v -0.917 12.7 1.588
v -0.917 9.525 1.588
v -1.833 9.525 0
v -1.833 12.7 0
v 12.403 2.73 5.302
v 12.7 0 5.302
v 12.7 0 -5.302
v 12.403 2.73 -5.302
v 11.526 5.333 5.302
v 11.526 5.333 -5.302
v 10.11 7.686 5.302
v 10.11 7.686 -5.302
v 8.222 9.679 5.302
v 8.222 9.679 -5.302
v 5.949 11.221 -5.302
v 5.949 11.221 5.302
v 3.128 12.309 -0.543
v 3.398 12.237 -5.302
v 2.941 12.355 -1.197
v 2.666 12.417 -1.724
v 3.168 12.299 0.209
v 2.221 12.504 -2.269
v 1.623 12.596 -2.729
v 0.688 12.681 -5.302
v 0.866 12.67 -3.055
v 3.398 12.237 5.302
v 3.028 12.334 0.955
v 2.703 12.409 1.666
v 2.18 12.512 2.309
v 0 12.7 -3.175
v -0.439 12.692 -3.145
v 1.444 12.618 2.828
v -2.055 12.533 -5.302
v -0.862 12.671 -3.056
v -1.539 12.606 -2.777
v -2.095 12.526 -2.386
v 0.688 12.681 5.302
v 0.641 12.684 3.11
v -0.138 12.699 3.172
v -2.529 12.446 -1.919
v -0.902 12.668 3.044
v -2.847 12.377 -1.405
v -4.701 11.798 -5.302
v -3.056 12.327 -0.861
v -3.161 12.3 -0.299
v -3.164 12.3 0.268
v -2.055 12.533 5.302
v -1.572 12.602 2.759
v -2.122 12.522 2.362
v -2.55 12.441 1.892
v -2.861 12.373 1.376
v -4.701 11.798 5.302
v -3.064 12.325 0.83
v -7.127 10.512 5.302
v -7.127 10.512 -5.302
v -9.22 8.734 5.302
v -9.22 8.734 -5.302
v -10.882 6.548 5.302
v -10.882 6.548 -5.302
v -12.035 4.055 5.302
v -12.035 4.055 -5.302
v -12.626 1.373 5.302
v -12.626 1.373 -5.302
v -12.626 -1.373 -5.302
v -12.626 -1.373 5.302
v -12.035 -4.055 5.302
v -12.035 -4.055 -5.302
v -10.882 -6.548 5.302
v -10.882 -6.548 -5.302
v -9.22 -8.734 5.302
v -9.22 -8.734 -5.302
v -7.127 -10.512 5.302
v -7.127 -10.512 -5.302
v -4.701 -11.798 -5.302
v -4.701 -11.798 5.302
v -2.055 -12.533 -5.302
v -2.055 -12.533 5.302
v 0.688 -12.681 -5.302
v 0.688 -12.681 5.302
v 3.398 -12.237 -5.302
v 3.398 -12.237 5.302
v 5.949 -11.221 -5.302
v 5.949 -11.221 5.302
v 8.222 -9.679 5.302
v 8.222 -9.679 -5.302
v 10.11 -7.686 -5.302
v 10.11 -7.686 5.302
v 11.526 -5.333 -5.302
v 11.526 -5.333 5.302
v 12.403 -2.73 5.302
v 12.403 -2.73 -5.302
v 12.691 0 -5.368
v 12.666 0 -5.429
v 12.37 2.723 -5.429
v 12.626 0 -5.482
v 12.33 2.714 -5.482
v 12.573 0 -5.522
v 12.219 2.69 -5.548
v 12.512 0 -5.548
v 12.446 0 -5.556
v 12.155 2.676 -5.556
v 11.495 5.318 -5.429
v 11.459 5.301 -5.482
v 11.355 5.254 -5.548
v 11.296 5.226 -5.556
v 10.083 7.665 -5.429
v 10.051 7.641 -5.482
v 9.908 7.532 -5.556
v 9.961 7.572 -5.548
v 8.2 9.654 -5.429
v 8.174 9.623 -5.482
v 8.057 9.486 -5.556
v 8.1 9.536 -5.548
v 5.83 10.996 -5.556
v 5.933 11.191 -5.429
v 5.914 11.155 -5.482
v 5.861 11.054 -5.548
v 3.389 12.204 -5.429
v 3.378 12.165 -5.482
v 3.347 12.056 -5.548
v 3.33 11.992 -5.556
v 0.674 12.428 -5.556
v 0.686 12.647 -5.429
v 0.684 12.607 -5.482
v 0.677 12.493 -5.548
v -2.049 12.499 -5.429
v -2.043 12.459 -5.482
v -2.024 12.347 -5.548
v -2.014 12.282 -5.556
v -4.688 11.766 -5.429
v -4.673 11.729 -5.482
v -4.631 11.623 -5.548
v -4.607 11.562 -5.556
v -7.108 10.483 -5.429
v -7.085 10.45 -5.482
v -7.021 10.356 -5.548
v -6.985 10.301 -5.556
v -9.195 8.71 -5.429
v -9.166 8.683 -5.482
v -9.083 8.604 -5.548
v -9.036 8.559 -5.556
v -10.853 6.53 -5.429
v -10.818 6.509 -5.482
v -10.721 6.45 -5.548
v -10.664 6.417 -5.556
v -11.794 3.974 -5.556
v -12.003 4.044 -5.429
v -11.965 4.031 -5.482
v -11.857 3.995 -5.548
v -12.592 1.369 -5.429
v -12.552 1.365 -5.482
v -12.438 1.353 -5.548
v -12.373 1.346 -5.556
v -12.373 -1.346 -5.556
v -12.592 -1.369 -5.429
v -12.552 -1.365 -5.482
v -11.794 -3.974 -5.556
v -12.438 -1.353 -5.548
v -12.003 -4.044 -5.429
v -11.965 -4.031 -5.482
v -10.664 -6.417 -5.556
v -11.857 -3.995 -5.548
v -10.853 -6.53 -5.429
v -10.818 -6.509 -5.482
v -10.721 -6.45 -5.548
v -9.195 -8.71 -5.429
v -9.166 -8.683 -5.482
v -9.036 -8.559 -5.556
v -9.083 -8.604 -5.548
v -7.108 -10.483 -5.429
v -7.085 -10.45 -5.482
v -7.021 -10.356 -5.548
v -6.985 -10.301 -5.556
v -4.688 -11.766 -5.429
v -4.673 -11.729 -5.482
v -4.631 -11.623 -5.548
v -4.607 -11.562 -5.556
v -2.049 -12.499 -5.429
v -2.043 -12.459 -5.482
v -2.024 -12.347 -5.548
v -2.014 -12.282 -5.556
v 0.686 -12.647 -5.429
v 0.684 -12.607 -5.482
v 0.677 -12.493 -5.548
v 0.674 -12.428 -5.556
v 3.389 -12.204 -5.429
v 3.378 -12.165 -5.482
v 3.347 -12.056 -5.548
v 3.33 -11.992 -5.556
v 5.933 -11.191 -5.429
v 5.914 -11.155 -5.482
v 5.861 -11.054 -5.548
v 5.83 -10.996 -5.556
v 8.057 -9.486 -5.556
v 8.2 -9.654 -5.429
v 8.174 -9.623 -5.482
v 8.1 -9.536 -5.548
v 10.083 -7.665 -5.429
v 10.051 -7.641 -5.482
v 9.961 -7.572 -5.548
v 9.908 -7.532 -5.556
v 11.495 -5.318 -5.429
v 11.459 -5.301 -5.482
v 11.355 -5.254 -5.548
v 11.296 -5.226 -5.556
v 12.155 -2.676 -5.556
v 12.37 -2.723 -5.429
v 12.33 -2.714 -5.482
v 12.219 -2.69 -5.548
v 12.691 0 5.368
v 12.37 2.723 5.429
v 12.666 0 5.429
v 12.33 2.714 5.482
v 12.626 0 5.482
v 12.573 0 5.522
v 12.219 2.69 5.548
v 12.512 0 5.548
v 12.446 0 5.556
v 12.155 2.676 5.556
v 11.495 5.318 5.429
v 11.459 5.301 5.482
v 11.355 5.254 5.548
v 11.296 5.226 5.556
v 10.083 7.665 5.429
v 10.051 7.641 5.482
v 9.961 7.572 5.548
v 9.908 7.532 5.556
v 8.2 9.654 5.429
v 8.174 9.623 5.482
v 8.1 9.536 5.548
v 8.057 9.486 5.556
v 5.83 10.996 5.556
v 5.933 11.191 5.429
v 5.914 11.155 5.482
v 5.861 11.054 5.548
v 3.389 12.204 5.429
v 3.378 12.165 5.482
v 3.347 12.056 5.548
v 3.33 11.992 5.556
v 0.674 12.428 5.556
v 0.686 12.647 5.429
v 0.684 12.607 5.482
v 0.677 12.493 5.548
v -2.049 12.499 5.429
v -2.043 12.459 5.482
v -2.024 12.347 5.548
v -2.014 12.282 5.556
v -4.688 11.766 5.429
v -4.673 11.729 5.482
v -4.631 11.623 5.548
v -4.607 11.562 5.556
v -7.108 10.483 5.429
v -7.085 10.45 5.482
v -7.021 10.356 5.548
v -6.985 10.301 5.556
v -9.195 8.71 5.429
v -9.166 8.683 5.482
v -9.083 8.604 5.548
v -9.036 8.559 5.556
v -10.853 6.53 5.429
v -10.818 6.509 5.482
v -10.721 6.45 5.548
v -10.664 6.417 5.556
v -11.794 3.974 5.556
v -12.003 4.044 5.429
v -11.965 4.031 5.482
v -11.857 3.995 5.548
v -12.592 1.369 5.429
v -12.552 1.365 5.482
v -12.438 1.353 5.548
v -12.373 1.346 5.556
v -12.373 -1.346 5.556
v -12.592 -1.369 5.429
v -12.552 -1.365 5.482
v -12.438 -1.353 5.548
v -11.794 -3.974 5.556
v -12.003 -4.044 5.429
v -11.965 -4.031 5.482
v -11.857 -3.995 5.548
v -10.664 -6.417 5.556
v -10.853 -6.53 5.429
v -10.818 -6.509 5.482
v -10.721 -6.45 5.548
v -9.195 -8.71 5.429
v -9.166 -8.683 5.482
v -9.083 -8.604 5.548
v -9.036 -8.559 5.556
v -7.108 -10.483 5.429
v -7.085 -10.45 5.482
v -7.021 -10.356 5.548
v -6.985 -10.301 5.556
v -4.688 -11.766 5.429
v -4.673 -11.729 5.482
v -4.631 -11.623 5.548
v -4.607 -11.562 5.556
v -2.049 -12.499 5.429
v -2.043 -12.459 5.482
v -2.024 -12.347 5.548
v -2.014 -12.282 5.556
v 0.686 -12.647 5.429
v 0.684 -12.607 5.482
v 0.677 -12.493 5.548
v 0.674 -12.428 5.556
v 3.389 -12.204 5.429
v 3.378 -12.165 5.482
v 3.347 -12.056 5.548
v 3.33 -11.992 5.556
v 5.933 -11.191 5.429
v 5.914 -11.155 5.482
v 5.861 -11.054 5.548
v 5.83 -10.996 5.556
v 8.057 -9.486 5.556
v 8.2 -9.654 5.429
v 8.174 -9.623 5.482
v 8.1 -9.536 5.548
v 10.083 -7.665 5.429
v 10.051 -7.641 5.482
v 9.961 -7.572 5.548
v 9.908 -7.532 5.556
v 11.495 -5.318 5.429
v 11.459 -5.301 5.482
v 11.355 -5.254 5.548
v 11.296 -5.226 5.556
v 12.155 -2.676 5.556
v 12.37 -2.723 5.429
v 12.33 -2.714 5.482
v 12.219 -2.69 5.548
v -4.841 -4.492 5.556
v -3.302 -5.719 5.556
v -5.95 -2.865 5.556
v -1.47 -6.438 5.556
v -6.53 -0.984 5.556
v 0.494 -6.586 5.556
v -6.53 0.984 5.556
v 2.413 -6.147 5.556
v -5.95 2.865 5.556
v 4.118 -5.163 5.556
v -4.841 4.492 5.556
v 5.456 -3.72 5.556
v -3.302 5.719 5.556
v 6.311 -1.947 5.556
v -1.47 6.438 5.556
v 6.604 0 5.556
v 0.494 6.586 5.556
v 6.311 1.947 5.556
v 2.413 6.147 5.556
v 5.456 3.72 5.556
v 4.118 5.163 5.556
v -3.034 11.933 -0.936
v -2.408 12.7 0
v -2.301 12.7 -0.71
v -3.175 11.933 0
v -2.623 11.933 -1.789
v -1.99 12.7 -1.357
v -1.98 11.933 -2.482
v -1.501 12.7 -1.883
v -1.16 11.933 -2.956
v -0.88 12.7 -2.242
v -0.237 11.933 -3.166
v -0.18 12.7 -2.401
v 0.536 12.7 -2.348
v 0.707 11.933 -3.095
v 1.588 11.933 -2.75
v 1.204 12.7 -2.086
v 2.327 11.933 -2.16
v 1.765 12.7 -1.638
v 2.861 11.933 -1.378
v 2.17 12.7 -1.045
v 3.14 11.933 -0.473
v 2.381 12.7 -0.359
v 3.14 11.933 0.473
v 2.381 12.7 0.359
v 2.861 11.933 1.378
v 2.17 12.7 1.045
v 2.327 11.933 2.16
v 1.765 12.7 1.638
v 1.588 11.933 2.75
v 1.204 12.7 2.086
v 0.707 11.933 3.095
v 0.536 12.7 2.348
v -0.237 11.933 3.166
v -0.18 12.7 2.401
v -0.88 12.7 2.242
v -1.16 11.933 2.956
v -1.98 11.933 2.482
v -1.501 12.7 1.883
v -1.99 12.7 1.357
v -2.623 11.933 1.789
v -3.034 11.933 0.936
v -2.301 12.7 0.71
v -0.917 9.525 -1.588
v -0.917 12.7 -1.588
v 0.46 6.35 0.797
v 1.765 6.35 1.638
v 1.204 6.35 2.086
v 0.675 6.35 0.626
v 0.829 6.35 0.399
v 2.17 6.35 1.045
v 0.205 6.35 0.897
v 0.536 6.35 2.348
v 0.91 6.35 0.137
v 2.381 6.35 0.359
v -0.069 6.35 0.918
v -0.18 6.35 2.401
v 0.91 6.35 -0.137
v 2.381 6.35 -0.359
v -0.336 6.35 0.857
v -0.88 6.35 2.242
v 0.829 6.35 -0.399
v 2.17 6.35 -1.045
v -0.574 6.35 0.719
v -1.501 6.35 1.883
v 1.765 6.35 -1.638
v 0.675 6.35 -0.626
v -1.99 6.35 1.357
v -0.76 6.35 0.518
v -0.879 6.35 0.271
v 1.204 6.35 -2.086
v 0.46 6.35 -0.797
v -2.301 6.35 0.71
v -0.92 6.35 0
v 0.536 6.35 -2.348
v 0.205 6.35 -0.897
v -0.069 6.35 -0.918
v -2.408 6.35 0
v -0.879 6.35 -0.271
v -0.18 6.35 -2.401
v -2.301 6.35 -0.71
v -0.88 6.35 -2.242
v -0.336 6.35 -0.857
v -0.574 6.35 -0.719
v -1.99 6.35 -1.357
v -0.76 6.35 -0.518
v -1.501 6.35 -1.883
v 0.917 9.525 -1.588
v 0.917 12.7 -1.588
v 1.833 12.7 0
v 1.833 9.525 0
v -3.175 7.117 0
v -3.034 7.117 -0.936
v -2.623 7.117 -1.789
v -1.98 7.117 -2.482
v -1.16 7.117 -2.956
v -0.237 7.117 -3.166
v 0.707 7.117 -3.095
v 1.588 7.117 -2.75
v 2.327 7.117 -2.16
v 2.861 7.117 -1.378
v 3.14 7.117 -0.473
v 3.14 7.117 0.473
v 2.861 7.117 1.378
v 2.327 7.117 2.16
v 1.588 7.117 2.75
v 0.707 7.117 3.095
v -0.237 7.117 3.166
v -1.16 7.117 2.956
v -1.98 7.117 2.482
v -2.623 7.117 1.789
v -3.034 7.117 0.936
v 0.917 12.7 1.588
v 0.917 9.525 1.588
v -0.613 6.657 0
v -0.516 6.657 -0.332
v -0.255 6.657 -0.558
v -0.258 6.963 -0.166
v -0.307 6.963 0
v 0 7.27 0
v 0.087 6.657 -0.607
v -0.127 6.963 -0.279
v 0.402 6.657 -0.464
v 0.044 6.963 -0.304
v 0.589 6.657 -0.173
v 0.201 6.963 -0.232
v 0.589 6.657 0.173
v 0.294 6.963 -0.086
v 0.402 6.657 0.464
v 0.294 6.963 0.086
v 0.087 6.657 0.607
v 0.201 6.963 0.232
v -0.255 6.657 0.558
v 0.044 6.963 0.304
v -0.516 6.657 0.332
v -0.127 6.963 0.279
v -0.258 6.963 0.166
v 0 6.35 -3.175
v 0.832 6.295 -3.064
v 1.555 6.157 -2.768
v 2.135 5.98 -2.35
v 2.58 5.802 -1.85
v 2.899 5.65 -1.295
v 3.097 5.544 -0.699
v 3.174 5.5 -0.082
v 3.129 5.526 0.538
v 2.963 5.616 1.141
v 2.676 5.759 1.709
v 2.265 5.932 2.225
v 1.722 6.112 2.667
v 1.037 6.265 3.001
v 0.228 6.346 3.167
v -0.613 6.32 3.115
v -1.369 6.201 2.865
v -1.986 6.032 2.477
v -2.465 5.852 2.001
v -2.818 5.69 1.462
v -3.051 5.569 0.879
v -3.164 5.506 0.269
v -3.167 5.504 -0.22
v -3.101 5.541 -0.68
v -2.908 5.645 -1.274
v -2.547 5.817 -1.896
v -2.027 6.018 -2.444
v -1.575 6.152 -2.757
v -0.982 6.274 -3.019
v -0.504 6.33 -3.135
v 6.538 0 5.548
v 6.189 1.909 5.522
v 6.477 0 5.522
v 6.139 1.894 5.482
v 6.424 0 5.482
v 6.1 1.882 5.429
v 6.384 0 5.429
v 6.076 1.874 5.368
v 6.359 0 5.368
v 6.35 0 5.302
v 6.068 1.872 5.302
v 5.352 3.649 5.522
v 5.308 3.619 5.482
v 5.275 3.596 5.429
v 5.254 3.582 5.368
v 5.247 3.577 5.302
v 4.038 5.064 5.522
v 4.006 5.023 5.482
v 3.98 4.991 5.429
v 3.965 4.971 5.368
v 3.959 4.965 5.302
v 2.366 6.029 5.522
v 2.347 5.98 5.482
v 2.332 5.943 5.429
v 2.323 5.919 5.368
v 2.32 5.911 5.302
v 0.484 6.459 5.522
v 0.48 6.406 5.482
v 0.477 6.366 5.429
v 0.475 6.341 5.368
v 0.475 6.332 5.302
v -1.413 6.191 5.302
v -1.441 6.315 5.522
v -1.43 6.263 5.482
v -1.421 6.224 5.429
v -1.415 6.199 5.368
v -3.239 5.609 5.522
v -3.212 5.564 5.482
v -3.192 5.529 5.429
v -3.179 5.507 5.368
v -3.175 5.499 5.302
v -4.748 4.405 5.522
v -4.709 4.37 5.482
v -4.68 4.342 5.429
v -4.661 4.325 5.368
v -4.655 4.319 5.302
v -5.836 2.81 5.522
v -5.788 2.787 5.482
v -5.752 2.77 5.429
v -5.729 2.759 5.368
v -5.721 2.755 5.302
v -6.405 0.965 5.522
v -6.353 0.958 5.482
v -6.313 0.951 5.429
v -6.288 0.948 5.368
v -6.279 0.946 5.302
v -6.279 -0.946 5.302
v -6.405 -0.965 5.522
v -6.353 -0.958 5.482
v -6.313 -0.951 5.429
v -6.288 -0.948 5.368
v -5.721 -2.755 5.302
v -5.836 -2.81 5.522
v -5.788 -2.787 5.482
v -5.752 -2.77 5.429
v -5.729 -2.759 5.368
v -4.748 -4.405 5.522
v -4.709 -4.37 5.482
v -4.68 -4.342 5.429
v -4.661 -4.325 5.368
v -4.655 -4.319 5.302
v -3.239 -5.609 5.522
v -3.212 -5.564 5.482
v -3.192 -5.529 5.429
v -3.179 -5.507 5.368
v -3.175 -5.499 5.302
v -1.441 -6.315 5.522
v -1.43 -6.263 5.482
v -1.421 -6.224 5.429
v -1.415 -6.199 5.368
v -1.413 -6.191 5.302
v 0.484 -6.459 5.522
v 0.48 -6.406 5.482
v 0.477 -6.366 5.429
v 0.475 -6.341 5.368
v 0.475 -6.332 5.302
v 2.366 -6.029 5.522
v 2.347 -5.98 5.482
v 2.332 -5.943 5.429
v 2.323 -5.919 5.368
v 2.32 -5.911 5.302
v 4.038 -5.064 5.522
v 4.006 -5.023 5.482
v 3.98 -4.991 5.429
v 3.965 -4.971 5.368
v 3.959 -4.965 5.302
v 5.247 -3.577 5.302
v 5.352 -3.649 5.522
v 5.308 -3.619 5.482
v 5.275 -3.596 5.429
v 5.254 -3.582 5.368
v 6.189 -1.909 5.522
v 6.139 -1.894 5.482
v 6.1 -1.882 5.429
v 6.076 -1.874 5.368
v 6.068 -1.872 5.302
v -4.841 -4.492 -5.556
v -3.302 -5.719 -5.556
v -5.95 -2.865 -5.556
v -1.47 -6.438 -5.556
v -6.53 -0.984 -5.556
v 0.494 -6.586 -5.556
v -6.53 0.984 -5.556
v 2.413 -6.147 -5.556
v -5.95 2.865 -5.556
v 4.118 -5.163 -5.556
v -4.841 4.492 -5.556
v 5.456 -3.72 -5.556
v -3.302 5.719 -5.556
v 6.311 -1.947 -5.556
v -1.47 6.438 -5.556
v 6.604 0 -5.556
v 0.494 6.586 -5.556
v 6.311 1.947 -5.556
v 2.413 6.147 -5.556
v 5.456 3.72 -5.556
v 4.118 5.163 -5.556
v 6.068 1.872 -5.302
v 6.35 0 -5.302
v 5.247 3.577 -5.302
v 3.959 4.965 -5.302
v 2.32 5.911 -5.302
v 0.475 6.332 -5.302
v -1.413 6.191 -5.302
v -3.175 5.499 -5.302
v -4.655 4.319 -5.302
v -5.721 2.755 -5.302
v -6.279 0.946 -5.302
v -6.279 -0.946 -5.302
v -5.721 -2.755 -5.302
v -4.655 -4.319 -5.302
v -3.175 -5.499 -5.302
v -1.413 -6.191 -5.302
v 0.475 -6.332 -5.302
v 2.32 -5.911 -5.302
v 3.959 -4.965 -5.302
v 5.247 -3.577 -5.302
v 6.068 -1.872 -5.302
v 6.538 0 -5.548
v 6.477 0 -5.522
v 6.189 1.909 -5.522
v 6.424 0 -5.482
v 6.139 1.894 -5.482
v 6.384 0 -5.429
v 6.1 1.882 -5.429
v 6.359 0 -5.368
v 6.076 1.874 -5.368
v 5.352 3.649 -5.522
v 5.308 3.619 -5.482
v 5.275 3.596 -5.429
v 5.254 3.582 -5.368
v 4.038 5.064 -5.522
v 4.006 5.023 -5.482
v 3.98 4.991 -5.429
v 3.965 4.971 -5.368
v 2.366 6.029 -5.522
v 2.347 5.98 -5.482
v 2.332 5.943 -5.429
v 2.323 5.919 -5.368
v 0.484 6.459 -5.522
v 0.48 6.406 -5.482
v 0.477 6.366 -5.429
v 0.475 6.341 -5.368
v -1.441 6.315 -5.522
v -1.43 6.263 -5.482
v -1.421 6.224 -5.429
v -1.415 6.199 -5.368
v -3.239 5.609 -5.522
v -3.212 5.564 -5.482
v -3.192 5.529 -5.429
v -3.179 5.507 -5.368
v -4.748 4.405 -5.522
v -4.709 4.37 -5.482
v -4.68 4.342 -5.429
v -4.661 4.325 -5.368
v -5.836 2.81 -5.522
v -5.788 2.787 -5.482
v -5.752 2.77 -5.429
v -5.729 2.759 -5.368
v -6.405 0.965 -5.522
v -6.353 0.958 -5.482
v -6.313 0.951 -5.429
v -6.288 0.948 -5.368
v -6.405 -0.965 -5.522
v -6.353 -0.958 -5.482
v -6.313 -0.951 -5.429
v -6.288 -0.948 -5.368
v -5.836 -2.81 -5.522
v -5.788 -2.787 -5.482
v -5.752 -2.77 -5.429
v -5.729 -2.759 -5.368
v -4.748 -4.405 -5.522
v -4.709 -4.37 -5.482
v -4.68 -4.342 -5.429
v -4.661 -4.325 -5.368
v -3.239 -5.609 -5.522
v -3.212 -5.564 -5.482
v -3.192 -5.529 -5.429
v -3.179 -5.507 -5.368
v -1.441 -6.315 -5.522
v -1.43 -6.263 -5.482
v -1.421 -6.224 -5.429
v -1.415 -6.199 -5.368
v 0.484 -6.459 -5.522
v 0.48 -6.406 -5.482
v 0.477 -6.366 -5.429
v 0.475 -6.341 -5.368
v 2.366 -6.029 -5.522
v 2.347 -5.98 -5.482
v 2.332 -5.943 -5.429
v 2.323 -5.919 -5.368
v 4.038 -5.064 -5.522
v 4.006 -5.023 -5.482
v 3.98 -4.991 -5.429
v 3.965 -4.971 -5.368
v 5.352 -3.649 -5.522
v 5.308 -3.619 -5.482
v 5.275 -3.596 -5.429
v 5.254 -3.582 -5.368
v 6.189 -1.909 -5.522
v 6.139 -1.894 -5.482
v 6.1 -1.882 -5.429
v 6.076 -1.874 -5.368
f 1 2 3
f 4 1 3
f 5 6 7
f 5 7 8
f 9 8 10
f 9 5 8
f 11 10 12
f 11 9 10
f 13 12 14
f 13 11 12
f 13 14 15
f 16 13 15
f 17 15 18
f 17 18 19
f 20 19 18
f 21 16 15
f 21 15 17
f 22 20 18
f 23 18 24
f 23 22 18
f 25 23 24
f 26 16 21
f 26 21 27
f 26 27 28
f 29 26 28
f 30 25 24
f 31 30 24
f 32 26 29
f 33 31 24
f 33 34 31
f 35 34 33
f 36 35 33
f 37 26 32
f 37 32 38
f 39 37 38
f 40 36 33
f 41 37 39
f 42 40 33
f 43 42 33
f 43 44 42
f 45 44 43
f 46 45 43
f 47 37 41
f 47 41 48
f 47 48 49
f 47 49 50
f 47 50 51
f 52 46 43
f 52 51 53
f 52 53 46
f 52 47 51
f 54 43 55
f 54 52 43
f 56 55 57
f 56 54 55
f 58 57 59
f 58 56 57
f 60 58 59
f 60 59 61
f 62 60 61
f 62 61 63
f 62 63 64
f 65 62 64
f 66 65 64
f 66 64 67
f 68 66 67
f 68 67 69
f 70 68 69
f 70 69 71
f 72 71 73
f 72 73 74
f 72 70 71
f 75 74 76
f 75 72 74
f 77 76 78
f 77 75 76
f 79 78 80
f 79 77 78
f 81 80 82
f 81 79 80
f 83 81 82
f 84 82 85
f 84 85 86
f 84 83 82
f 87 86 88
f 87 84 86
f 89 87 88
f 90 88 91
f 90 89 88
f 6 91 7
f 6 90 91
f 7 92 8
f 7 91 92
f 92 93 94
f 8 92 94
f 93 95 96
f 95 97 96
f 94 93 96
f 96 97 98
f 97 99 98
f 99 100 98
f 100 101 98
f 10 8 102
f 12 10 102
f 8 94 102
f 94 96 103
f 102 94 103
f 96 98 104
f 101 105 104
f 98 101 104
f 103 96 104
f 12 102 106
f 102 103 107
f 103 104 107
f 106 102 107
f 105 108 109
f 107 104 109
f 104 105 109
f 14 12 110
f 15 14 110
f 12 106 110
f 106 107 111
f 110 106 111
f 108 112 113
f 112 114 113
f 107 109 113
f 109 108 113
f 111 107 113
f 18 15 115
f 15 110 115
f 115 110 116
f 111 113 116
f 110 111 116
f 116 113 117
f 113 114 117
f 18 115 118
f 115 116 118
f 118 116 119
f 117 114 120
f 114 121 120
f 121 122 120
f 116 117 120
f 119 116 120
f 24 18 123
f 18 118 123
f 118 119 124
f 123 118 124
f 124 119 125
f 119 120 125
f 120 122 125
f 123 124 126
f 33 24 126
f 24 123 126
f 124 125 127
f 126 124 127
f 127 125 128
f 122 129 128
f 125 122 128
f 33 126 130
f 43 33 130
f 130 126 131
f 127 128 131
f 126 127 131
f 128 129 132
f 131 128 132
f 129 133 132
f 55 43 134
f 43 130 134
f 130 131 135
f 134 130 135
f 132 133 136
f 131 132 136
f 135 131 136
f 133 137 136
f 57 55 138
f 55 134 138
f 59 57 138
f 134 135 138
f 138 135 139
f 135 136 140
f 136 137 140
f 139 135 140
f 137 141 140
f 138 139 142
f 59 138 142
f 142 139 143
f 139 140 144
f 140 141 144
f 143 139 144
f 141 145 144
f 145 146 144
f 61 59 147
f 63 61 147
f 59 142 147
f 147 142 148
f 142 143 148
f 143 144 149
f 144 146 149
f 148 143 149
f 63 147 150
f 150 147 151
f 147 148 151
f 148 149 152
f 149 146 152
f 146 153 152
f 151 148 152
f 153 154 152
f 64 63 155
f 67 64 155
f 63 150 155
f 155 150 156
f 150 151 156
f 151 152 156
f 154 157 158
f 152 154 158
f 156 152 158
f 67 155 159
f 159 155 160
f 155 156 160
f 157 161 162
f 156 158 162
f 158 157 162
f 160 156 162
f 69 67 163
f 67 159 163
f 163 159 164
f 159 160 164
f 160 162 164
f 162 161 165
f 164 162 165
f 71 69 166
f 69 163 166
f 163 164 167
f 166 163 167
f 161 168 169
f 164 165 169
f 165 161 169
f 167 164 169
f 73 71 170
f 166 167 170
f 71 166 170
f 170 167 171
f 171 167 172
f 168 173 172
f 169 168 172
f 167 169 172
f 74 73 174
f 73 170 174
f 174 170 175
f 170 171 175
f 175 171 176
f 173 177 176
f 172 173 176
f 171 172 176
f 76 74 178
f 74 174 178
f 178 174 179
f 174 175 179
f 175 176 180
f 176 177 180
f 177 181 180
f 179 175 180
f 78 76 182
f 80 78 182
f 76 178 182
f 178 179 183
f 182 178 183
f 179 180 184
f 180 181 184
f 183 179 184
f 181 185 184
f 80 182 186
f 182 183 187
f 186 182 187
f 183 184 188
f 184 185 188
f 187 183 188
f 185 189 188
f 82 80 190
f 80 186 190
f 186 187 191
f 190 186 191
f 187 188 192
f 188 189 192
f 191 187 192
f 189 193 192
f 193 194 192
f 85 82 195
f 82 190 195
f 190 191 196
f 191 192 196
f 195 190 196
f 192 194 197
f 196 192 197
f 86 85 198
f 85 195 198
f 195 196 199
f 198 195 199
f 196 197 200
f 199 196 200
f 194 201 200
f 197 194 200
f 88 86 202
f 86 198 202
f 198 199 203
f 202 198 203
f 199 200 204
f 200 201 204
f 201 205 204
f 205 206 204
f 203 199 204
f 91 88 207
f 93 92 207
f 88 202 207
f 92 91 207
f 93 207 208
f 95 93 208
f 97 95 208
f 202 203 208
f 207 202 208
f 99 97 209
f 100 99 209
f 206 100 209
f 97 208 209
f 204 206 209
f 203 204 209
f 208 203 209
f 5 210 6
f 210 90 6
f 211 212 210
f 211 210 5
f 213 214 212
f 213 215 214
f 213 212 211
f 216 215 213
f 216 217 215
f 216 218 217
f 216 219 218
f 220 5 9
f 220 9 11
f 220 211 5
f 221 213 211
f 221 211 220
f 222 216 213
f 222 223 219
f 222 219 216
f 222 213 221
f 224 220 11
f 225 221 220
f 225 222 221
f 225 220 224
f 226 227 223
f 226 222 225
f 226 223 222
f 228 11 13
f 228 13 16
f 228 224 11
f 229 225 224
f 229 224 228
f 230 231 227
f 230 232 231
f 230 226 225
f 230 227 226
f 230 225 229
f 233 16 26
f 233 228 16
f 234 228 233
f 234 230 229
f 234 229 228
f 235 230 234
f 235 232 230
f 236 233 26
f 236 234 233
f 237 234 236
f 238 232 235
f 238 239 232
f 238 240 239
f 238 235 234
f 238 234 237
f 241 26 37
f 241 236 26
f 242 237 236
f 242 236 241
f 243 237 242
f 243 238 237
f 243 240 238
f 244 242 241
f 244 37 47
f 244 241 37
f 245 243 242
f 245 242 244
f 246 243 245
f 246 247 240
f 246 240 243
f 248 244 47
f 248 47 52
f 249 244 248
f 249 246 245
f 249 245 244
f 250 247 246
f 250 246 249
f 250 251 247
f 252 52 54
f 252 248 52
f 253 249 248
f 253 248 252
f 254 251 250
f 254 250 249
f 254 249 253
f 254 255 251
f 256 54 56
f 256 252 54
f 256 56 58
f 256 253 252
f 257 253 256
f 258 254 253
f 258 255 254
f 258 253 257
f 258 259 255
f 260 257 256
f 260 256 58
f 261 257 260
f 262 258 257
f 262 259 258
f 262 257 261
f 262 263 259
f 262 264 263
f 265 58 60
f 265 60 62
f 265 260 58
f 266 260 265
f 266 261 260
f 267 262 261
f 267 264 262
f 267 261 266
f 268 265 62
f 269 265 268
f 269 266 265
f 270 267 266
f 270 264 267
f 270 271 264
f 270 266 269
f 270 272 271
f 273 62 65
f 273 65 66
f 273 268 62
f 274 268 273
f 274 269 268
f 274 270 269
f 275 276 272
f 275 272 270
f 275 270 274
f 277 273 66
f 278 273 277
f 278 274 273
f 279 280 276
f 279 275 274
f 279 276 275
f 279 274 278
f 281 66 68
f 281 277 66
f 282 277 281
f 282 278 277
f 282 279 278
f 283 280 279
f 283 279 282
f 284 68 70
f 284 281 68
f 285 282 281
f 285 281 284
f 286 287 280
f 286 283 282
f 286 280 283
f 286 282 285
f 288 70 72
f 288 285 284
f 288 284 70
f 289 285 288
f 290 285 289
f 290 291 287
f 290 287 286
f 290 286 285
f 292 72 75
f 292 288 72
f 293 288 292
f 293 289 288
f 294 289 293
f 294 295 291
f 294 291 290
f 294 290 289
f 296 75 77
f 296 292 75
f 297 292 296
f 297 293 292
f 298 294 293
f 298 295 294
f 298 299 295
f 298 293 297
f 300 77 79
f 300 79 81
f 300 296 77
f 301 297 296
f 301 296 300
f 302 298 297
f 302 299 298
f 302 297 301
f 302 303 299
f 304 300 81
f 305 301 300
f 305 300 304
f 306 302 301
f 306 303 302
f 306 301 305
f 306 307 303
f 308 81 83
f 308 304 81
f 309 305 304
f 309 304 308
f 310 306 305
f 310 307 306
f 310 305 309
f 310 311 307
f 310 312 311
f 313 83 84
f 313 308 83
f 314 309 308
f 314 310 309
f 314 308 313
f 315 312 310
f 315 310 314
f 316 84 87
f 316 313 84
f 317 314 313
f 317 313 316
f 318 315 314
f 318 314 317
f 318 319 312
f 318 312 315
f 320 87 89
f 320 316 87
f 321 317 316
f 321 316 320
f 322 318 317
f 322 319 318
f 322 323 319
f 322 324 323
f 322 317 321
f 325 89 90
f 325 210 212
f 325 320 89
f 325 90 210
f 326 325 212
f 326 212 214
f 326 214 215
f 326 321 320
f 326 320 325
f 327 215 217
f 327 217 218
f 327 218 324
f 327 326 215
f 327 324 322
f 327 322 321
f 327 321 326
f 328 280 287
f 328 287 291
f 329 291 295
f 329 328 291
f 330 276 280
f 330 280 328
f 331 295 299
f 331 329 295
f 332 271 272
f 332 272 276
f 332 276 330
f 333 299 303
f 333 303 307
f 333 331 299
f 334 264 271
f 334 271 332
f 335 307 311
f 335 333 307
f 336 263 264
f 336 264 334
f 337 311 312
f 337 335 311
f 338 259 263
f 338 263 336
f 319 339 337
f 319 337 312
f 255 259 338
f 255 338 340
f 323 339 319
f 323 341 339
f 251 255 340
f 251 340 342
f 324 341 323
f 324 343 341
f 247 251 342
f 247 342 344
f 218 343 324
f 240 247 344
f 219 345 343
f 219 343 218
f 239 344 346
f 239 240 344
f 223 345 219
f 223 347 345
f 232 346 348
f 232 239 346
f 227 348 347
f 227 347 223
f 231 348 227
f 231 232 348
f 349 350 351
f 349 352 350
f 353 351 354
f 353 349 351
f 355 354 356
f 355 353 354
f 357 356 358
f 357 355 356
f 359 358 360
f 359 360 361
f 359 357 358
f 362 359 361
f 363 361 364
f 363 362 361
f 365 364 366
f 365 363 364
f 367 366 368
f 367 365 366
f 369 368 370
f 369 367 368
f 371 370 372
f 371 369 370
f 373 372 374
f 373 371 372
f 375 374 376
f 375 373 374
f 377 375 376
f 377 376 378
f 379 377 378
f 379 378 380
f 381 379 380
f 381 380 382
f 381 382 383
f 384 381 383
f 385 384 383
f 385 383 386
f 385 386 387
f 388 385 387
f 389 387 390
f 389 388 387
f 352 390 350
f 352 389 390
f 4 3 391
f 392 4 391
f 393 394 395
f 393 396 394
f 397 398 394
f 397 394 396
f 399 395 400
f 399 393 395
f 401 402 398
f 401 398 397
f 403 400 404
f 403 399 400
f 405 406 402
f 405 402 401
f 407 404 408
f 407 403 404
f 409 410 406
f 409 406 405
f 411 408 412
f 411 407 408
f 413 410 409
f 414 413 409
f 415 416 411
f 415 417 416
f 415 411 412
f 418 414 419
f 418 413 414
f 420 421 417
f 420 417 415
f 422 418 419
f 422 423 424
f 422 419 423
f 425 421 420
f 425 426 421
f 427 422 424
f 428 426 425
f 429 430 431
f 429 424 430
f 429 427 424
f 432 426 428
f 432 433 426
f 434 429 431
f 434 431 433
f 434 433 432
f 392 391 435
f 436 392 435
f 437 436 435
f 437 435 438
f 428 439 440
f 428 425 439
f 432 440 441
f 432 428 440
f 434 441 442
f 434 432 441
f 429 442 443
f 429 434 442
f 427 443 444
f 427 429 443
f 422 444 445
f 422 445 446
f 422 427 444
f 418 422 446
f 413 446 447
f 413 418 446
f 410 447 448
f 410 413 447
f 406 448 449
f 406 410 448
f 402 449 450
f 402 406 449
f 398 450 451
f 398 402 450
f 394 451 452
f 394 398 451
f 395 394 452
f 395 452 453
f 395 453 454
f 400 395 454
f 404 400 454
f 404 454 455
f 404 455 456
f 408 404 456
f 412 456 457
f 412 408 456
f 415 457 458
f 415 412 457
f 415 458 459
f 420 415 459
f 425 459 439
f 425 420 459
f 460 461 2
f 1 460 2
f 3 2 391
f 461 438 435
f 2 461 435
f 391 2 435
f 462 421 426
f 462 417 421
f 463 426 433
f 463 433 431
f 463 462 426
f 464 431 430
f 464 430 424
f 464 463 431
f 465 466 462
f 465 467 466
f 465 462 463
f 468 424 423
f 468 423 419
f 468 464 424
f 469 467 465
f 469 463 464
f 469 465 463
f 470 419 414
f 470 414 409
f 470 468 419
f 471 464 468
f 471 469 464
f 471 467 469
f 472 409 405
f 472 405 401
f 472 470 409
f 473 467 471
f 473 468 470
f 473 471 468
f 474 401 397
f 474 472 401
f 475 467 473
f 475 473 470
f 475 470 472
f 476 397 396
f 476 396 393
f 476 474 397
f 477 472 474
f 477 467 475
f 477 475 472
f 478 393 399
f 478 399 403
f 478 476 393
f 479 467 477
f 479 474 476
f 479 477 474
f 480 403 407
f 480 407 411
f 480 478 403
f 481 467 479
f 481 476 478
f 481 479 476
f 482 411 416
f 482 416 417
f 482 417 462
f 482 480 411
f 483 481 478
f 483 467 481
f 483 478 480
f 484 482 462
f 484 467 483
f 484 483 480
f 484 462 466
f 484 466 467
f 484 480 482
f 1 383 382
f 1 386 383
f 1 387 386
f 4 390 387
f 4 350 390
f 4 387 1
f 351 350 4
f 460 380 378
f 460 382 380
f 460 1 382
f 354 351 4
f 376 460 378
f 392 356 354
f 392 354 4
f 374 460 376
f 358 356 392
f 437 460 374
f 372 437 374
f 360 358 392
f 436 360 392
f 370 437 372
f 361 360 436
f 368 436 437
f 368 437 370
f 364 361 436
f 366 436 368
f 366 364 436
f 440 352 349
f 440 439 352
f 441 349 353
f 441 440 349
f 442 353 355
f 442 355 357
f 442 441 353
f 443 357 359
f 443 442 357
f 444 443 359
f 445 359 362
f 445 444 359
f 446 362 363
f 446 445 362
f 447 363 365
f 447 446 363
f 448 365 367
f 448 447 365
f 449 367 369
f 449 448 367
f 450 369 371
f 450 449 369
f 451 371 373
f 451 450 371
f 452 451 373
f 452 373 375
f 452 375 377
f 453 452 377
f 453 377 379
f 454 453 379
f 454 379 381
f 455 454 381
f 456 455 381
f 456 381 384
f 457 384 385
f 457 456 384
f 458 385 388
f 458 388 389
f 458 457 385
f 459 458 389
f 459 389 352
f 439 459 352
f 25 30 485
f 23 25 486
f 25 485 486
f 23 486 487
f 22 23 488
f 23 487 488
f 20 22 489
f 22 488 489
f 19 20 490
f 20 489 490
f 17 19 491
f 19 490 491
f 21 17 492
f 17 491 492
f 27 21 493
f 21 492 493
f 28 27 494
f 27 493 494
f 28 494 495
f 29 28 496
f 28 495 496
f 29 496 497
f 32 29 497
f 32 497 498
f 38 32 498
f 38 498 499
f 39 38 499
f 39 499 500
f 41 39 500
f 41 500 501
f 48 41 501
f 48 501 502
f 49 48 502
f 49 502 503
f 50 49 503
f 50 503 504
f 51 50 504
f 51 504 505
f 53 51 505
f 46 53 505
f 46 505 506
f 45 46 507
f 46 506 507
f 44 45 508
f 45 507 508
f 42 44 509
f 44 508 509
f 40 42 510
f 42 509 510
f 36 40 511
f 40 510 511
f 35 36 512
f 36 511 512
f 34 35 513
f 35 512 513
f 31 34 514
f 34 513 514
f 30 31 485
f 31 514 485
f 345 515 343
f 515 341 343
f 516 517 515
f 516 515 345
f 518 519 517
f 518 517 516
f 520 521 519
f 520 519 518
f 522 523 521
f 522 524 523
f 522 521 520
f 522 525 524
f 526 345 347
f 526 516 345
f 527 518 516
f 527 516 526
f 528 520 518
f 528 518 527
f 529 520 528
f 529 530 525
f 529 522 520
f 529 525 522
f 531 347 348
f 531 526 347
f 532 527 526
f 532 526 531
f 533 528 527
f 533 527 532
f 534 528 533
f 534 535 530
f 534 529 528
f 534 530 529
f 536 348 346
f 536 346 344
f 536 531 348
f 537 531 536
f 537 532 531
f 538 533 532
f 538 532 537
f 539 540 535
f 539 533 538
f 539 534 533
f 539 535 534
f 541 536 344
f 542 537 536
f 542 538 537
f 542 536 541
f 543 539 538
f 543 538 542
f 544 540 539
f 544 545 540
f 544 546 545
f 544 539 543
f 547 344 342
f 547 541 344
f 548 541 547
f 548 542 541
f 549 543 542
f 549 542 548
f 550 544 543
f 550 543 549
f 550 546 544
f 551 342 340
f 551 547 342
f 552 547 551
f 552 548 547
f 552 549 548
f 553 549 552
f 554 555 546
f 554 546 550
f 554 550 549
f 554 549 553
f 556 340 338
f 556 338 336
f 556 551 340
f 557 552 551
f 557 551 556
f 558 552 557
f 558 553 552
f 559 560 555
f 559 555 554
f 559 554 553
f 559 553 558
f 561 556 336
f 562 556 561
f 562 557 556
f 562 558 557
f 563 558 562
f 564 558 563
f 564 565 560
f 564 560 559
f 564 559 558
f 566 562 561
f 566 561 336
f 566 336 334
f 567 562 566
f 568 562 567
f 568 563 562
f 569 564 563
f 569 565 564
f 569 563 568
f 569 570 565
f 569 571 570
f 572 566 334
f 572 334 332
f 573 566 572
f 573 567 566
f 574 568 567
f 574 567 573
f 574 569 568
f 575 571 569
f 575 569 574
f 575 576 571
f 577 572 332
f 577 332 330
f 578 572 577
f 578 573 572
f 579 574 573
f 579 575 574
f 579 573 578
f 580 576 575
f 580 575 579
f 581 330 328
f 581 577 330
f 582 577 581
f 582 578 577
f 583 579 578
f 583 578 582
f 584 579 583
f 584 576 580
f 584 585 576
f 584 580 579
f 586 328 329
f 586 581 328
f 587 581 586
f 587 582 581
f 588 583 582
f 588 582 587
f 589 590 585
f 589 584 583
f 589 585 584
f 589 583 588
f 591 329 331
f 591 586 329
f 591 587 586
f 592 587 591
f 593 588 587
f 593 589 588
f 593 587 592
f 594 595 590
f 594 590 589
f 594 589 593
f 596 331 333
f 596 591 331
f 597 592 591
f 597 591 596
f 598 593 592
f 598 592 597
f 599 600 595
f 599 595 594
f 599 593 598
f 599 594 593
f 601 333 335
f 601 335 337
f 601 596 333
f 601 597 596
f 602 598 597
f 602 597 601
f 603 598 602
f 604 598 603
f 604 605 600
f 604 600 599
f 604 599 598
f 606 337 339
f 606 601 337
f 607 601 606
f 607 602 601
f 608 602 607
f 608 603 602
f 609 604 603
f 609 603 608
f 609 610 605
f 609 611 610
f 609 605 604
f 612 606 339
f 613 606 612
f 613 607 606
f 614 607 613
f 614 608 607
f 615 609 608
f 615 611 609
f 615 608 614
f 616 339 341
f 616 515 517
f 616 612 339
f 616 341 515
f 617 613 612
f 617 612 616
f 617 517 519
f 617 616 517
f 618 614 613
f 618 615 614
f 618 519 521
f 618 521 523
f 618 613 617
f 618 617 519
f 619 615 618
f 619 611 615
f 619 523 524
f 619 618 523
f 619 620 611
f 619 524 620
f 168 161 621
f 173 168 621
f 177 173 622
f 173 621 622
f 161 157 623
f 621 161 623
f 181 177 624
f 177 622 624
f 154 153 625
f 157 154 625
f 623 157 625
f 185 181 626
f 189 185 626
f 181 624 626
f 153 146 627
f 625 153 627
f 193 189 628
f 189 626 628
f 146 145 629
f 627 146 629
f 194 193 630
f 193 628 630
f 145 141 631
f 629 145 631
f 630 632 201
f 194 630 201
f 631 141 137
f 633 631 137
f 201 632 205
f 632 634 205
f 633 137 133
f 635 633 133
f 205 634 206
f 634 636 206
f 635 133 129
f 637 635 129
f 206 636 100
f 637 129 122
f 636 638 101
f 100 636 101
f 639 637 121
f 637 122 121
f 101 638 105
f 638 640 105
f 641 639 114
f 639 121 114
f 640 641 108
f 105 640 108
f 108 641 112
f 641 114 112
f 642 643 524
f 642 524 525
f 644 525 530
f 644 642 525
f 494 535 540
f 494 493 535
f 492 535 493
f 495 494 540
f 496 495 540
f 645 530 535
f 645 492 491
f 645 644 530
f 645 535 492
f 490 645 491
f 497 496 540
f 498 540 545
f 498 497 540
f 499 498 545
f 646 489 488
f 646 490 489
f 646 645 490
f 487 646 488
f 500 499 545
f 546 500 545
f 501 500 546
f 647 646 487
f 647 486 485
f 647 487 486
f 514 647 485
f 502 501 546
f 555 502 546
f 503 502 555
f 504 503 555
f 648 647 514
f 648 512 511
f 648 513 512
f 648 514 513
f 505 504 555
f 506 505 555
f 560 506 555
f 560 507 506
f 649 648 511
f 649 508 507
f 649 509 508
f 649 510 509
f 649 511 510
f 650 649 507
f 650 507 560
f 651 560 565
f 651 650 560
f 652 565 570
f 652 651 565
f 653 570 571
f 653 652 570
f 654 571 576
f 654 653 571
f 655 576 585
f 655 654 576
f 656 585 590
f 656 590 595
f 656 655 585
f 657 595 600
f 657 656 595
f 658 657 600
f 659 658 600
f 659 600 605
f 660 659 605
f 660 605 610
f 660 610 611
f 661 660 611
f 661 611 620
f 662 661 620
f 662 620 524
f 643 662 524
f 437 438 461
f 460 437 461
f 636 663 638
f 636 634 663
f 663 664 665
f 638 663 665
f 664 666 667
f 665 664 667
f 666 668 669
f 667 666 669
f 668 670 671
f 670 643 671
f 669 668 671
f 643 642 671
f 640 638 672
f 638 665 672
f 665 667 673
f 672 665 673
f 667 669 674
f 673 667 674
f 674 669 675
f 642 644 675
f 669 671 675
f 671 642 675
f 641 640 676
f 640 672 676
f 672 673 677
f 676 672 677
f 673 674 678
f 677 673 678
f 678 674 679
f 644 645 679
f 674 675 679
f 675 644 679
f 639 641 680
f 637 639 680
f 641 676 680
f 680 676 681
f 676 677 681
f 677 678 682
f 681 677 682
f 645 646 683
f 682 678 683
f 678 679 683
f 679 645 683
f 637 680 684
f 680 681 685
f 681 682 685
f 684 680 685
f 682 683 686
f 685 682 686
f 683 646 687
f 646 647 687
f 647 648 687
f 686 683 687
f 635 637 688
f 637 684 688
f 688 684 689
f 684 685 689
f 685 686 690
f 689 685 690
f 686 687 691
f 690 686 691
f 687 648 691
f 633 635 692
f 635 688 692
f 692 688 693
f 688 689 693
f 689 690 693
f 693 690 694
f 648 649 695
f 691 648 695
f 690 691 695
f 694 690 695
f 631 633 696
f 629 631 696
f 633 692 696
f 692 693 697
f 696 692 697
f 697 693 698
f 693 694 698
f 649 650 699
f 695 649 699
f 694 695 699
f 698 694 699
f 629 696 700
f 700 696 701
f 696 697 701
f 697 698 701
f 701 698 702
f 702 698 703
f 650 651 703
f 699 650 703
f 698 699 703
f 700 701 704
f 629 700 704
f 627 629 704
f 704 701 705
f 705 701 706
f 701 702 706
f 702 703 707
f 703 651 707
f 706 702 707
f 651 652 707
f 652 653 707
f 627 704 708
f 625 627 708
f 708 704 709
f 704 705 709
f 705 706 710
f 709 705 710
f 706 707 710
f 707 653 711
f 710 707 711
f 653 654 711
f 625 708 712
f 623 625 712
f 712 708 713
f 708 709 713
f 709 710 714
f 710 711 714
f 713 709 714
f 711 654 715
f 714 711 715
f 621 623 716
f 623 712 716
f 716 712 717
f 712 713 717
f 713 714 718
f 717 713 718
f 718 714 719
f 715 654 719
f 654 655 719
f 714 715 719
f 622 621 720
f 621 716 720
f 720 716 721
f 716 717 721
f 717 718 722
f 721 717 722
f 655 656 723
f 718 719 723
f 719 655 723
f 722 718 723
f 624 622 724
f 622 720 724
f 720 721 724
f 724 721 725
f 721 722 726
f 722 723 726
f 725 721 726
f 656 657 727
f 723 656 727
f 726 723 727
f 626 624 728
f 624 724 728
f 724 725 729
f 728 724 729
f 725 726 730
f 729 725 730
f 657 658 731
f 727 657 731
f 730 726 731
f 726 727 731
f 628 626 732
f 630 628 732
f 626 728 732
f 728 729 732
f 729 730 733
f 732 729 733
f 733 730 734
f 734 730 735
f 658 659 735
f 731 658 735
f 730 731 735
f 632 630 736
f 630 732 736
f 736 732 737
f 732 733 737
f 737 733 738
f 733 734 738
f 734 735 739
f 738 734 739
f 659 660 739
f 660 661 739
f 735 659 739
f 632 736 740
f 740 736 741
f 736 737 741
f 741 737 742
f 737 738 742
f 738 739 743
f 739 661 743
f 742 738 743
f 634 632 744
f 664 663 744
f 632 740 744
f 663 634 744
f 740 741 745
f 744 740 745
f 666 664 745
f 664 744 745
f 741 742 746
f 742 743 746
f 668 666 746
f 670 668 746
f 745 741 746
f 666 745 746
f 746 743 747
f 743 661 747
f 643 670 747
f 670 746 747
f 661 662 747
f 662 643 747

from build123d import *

# Parameters (mm, degrees)
SKETCH1_R          = 12.7
SKETCH1_R_2        = 6.35
EXTRUDE1_DEPTH     = 5.55625
SKETCH2_R          = 3.175
CUT_EXTRUDE1_DEPTH = 13.7
FILLET1_R          = 0.254
CUT_EXTRUDE2_DEPTH = 3.175


with BuildPart() as part:
    # Sketch1 → Extrude1 (new body, symmetric)
    with BuildSketch(Plane.XY):
        Circle(SKETCH1_R)
        Circle(SKETCH1_R_2, mode=Mode.SUBTRACT)
    extrude(amount=EXTRUDE1_DEPTH, both=True)

    # Sketch2 → Cut-Extrude1 (cut, through all)
    with BuildSketch(Plane(origin=(41.275, 0, 0), x_dir=(0, 0, -1), z_dir=(0, -1, 0))):
        with Locations((0, -41.275)):
            Circle(SKETCH2_R)
    extrude(amount=-CUT_EXTRUDE1_DEPTH, mode=Mode.SUBTRACT)

    # Fillet1
    fillet1_edges = [part.edges().sort_by_distance(p)[0] for p in [
        (-12.7, 0, -5.55625),
        (-12.7, 0, 5.55625),
        (-6.35, 0, -5.55625),
        (-6.35, 0, 5.55625),
    ]]
    fillet(fillet1_edges, radius=FILLET1_R)


with BuildPart() as body_2:
    # Sketch3 → Revolve1 (revolve)
    with BuildSketch(Plane.XY):
        Polygon((-2.408192631, 6.35), (-0.920168843, 6.35), (0, 7.270168843), (0, 12.7), (-2.408192631, 12.7), (-3.175, 11.933192631), (-3.175, 7.116807369), align=None)
    revolve(axis=Axis((0, 6.35, 0), (0, -1, 0)))

    # Sketch4 → Cut-Extrude2 (cut)
    with BuildSketch(Plane(origin=(3.3734375, 12.7, 0), x_dir=(0, 0, -1), z_dir=(0, -1, 0))):
        Polygon((0, -1.540350395), (-1.5875, -2.456893948), (-1.5875, -4.289981052), (0, -5.206524605), (1.5875, -4.289981052), (1.5875, -2.456893948), align=None)
    extrude(amount=CUT_EXTRUDE2_DEPTH, mode=Mode.SUBTRACT)


solid = Compound([part.part, body_2.part])
